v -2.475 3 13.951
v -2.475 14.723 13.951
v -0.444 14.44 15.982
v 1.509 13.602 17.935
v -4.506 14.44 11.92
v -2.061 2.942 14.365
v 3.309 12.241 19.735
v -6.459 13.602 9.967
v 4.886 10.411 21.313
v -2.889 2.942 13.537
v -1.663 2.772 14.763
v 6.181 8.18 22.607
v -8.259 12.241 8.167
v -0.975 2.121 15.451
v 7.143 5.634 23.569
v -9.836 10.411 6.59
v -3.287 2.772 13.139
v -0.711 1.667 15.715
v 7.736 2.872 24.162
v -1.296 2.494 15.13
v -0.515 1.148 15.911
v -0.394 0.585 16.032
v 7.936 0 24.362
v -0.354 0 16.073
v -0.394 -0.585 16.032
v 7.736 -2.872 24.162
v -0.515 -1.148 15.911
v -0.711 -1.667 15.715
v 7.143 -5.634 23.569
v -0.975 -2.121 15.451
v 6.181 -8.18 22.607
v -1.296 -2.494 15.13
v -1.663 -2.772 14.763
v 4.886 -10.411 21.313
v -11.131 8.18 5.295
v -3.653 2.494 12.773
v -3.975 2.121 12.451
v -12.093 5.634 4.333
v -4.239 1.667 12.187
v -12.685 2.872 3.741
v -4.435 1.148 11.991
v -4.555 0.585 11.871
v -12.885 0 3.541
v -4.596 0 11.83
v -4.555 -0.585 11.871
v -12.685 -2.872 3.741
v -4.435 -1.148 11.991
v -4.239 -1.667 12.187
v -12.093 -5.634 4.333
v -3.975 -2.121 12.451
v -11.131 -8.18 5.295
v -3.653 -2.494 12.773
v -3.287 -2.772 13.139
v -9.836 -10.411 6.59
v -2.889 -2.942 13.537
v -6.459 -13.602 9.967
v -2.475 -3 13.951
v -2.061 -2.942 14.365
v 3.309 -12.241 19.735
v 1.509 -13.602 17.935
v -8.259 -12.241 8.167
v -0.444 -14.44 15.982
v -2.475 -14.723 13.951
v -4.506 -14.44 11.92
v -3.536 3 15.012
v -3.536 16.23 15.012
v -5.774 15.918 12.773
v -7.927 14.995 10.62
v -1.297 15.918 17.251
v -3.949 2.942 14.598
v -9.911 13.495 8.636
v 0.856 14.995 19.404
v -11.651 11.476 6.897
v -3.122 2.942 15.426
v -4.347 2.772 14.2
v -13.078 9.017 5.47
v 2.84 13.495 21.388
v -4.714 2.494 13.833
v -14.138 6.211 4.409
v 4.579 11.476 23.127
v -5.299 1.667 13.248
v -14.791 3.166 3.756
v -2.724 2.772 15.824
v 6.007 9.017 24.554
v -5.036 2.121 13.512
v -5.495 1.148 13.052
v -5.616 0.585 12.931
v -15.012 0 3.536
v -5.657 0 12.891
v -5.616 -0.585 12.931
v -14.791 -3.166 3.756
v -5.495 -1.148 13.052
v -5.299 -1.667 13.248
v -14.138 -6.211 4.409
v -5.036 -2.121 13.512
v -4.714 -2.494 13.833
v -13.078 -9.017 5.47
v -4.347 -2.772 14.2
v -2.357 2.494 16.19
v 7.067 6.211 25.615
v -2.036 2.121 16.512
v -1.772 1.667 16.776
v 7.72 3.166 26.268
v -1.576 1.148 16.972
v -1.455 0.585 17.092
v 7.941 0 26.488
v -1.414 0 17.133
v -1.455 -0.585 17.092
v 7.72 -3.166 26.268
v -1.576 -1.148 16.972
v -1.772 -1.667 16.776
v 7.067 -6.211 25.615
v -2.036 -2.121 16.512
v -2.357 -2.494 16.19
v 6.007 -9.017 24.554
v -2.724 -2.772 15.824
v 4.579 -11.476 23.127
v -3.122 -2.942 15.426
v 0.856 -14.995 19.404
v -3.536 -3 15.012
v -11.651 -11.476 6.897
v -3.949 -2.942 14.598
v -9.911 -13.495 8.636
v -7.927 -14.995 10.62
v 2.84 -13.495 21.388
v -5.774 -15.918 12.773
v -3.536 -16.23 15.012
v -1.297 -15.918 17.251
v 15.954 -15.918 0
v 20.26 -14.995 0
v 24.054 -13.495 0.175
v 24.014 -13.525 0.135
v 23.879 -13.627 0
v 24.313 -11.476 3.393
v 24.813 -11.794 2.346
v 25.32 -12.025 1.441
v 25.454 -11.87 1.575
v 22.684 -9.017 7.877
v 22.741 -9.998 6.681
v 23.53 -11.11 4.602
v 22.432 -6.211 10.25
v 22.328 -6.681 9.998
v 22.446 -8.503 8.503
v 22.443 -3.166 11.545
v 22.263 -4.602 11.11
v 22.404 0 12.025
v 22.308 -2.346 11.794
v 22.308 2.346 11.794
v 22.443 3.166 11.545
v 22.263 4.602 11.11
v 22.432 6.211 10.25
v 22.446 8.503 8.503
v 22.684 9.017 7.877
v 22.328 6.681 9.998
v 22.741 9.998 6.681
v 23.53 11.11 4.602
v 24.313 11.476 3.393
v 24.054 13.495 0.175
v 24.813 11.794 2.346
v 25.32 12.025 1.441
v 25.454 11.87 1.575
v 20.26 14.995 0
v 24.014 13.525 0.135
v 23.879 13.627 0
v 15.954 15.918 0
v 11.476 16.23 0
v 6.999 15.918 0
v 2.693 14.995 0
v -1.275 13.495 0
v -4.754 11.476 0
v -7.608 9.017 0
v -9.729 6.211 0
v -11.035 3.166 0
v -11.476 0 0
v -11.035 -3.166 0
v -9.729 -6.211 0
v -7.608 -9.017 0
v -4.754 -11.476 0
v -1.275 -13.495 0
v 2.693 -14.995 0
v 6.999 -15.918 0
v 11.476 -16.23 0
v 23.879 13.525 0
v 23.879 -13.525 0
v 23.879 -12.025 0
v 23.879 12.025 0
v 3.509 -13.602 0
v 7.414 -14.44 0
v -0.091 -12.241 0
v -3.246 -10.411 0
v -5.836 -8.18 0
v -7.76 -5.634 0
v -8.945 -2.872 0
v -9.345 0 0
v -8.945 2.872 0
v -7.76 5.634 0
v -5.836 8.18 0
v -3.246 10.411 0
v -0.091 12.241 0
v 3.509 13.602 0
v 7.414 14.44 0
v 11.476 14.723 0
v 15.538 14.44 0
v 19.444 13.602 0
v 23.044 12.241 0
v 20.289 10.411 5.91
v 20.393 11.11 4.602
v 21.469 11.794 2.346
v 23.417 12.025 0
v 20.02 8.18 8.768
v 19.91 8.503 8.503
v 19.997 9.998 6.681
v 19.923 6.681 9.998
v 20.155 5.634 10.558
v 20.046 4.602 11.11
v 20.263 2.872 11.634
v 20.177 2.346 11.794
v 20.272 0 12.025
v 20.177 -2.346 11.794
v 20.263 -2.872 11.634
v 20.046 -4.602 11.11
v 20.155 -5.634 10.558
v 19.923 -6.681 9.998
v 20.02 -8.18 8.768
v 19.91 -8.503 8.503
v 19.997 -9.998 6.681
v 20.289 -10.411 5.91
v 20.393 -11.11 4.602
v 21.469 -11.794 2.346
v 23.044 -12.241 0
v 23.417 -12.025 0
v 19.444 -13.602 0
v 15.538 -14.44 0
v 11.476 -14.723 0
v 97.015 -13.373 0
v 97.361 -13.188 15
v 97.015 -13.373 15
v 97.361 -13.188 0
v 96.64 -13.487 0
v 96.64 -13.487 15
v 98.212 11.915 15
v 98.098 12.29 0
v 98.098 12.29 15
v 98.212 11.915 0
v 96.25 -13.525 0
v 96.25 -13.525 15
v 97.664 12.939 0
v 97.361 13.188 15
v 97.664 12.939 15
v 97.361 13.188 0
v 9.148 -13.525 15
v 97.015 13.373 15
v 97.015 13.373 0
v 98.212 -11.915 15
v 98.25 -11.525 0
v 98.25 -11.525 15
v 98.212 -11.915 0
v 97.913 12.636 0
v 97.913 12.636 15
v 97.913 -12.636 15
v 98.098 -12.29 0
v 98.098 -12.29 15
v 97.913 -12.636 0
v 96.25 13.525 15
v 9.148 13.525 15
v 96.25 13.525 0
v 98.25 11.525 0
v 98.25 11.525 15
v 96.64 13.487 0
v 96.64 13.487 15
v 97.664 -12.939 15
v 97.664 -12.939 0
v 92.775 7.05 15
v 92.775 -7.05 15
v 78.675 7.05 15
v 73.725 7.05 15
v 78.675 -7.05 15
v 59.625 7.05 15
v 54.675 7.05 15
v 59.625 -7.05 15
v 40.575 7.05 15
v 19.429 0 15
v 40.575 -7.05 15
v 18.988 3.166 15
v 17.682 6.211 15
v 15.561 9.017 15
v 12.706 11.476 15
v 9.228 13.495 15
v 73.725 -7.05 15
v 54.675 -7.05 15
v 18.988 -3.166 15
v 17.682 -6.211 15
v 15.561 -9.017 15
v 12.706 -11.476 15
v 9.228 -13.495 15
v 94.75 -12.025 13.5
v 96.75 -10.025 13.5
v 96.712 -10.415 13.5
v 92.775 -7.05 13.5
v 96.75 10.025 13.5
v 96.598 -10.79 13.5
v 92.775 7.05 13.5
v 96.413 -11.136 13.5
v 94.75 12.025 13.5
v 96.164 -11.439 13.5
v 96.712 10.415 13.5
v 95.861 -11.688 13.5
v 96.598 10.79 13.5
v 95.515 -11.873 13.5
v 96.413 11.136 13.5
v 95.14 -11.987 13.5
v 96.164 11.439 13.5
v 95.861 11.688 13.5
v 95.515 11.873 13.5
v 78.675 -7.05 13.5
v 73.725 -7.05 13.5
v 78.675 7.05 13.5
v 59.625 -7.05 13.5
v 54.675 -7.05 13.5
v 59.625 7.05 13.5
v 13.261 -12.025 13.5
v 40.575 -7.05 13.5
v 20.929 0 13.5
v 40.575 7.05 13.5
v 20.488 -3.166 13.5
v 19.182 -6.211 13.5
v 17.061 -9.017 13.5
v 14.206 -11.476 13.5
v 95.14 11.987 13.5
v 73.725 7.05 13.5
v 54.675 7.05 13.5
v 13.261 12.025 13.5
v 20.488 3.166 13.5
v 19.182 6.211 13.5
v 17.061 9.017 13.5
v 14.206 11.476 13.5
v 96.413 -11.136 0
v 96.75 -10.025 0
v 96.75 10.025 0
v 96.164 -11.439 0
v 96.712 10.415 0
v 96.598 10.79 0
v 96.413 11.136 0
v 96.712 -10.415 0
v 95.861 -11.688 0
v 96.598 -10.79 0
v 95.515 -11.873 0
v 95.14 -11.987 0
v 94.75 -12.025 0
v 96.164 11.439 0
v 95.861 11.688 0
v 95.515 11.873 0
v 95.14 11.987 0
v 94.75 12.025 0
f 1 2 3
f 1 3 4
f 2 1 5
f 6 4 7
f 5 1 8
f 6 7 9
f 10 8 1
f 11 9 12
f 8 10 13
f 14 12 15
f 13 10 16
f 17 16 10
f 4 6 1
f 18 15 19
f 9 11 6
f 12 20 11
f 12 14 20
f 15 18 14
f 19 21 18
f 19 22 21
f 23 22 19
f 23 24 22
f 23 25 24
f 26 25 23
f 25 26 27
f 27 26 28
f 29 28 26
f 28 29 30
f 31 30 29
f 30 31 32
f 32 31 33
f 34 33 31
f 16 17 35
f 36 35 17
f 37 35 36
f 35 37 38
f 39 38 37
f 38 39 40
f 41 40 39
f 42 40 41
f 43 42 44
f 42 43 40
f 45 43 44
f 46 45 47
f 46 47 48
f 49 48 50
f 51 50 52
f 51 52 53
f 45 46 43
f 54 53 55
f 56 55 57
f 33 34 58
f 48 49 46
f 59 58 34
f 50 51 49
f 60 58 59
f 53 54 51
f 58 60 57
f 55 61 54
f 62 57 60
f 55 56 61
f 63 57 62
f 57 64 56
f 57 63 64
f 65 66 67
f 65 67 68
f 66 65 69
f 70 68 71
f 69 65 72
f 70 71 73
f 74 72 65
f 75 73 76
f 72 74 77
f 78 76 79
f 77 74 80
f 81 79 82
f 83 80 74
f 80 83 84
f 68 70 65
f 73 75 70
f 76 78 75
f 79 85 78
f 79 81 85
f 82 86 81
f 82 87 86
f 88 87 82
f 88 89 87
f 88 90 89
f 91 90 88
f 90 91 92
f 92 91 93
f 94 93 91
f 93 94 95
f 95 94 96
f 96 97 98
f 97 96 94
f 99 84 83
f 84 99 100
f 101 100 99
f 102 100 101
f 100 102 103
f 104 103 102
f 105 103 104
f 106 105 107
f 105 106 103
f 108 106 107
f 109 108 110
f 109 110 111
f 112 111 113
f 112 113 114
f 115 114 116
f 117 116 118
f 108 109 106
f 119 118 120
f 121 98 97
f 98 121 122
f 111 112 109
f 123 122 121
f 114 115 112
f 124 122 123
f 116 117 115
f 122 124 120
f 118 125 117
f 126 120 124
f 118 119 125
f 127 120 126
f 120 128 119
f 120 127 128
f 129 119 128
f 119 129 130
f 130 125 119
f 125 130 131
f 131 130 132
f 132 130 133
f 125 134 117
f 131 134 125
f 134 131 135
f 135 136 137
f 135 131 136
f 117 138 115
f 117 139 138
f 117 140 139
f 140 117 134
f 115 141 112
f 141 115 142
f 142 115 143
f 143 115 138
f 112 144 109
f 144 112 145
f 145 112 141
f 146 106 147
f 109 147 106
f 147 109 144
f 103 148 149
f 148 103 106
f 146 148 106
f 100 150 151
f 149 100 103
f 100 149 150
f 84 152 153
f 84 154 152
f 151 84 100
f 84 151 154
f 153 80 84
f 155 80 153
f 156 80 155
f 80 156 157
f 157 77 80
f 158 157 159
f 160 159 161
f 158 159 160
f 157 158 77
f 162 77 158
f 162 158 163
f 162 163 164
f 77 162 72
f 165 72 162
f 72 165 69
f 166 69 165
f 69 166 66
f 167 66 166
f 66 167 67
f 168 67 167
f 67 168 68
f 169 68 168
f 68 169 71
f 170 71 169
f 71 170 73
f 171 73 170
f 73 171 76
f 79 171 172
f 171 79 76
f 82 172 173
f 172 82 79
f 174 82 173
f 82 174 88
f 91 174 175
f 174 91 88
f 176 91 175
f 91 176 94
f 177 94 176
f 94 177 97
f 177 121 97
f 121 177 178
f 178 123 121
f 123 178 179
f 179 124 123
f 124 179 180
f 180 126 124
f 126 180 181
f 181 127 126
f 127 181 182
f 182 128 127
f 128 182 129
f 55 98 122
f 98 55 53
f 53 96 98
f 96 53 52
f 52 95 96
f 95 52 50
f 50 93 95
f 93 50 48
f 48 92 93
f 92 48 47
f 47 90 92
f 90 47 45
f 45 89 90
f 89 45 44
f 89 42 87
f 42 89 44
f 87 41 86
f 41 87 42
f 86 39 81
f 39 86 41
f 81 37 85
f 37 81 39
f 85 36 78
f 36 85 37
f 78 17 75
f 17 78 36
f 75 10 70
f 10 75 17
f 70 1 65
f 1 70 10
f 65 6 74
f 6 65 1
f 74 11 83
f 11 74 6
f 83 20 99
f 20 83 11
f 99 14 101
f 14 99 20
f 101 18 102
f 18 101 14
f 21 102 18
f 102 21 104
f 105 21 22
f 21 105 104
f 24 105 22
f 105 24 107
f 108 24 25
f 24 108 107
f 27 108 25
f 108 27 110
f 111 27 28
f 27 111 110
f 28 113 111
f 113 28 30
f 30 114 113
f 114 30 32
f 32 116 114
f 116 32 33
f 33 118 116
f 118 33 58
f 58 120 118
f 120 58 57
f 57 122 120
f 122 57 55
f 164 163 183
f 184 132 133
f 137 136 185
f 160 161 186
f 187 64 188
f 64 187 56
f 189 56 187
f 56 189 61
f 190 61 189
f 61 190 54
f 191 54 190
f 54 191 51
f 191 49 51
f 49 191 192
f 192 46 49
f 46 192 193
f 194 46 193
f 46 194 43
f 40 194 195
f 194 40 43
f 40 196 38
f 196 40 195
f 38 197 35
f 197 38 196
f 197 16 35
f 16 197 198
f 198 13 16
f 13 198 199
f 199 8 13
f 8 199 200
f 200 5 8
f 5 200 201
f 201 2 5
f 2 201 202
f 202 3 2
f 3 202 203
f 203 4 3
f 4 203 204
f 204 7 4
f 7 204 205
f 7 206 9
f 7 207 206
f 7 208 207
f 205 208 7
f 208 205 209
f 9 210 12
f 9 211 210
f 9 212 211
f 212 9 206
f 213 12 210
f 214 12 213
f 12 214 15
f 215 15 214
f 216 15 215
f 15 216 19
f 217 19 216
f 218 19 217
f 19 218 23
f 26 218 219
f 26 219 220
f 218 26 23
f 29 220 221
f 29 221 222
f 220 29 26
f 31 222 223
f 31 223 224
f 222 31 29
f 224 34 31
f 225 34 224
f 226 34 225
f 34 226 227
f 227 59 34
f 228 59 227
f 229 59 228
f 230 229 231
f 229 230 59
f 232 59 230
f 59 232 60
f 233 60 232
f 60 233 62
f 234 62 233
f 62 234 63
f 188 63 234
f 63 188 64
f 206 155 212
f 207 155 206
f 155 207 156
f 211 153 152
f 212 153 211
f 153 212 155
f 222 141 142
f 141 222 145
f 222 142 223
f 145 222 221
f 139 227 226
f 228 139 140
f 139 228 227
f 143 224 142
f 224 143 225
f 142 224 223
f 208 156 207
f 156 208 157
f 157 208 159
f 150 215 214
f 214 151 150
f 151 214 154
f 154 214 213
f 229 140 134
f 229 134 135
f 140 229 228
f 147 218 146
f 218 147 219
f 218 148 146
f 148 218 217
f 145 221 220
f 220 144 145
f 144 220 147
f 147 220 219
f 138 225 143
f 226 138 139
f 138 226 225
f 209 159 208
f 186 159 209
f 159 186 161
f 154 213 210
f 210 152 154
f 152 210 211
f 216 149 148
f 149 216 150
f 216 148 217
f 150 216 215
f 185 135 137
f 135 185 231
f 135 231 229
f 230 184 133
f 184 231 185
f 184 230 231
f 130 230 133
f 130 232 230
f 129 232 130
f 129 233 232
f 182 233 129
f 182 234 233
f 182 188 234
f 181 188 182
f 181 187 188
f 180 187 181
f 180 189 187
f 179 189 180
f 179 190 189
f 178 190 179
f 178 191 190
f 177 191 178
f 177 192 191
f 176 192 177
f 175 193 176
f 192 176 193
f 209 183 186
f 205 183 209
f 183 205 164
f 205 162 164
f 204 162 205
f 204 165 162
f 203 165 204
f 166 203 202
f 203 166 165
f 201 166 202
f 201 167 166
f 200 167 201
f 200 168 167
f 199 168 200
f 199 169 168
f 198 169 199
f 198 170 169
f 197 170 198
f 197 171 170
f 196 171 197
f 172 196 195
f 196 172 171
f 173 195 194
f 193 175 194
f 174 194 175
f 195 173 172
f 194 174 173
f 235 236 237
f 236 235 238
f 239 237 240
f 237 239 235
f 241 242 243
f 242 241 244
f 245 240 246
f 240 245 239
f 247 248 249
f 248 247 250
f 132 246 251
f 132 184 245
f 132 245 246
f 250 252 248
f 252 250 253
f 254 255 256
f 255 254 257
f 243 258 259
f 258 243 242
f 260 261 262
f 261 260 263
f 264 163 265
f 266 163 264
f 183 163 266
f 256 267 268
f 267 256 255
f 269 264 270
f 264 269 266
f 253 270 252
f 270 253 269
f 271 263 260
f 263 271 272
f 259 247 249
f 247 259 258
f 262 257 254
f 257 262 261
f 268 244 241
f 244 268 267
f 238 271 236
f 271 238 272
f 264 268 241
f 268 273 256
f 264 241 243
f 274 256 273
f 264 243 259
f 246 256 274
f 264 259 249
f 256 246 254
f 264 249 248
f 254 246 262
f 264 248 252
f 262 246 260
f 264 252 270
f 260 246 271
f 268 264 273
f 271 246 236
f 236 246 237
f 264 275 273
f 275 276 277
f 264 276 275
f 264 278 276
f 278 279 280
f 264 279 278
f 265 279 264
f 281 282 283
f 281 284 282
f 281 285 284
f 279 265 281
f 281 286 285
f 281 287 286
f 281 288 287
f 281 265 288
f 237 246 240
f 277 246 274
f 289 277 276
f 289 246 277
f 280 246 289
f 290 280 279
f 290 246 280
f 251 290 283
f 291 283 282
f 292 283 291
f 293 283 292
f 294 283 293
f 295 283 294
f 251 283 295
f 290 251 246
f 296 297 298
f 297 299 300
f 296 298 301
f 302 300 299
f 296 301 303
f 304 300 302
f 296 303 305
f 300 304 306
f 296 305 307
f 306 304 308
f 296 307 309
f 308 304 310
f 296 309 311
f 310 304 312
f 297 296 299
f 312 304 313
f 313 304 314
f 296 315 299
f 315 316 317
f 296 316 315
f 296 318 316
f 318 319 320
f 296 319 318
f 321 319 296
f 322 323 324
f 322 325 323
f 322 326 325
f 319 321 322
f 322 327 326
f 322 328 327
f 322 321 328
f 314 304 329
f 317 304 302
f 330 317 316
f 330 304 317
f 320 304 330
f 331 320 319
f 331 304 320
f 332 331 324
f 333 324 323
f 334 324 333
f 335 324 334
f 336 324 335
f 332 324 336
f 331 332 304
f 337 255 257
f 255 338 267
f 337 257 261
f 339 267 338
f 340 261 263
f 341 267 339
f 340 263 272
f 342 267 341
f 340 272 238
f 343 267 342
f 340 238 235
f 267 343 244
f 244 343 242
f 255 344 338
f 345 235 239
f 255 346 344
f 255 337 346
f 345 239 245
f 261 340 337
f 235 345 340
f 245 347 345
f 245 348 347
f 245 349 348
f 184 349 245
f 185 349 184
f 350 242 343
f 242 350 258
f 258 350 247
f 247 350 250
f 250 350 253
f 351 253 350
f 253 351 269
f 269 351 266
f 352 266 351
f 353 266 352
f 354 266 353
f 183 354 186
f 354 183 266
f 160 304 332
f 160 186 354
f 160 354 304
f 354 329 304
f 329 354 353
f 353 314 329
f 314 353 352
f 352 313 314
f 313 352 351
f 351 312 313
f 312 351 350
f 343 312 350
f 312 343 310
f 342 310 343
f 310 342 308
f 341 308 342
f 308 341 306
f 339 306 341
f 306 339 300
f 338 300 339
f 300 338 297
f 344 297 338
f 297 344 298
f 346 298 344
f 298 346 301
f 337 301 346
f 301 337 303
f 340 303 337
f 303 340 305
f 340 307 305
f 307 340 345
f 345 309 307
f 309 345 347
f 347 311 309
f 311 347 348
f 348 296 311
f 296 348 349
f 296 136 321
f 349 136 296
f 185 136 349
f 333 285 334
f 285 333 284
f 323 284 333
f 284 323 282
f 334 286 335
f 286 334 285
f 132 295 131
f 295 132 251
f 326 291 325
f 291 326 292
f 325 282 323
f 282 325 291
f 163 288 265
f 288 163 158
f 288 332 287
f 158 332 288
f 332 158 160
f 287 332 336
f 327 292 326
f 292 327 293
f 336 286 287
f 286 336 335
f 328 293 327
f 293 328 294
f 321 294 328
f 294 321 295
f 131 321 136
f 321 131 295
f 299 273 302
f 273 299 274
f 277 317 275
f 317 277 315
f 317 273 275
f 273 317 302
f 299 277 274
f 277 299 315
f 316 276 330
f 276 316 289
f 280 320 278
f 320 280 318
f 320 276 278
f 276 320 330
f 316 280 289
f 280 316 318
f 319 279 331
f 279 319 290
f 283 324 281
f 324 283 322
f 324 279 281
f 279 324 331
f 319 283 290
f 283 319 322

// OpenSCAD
$fn = 32;
thin = 0.00001;
border_radius = 2;
// See https://matt3o.com/anatomy-of-a-keyboard/
switch_hole_size = 14;
switch_distance_between_holes = 5.05;
keycap_placeholder_space = switch_hole_size + switch_distance_between_holes;
switch_tolerance = 0.1;

wall_thickness = 1.5;

x_size = keycap_placeholder_space * 5;
y_size = keycap_placeholder_space + 5;
h_size = 15;
body_base_x = x_size + wall_thickness * 2;
body_base_y = y_size + wall_thickness * 2;

knob_chamfer = 1;
knob_oversized_by = (1 / 5) * body_base_y;
knob_radius = (body_base_y / 2) + knob_oversized_by / 2;
knob_height = 11;
knob_elevation = 5;
knob_rotation = [ 0, -45, 0 ];

shaft_height = 10.20;
shaft_radius = 3;
shaft_tolerance = 0.075;

module cut()
{
    h = 100;
    x = 200;
    y = 50;
    translate([ 0, -y / 2, 0 ]) cube([ x, y, h ], true);
}

module table()
{
    h = 25;
    x = 100;
    y = 100;
    translate([ 0, 0, -h / 2 ]) cube([ x, y, h ], true);
}

module rotary_encoder()
{
    translate([ 0, 0, -10 ])
    {
        translate([ 0, 0, 5 ]) cube([ 12, 12, 10 ], center = true);
        translate([ 0, 0, 10 ]) cylinder(7, r = 7 / 2);
        translate([ 0, 0, 10 + 7 ]) cylinder(12.5, r = 6 / 2);
    }
}

module knob()
{
    translate([ 0, 0, 0.5 + knob_elevation ])
    {
        difference()
        {
            union()
            {
                cylinder(h = knob_height - knob_chamfer, r = knob_radius);

                translate([ 0, 0, knob_height - knob_chamfer ]) hull()
                {
                    linear_extrude(height = thin) circle(r = knob_radius);
                    translate([ 0, 0, knob_chamfer ]) linear_extrude(height = thin) offset(delta = -knob_chamfer)
                        circle(r = knob_radius);
                }
            }

            difference()
            {
                cylinder(h = knob_height - wall_thickness, r = shaft_radius + shaft_tolerance);
                translate([ -shaft_radius, shaft_radius / 1.7, 0 ]) cube([ shaft_radius * 2, 10, shaft_height ]);
            }
        }
    }
}

module knob_base()
{
    h = 25;

    translate([ 0, 0, -h ])
    {
        translate([ 0, 0, h + knob_elevation - wall_thickness ]) linear_extrude(height = wall_thickness) difference()
        {
            circle(r = knob_radius);
            circle(r = shaft_radius);
        }
        linear_extrude(height = knob_elevation + h) difference()
        {
            circle(r = knob_radius);
            offset(delta = -wall_thickness) circle(r = knob_radius);
        }
    }
}

module knob_assembly()
{
    difference()
    {
        translate([ 0, 0, knob_radius / sqrt(2) ]) rotate(knob_rotation)
        {
            // translate([ 0, 0, knob_elevation - wall_thickness ]) color([ 0, 0, 1, 0.8 ]) rotary_encoder();
            // knob();
            knob_base();
        }

        // hole for body

        color("red") translate([ knob_radius / sqrt(2), 0, 0 ]) rotate([ 0, 90, 0 ])
            cylinder(h = x_size / 2, r = y_size / 2);
        table();
    }
}

module body()
{
    difference()
    {
        translate([ body_base_x / 2, 0, 0 ])
        {
            body_base_x_corrected = body_base_x - (border_radius * 2);
            body_base_y_corrected = body_base_y - (border_radius * 2);

            color("blue") translate([ 0, 0, h_size - wall_thickness ]) linear_extrude(height = wall_thickness)
                offset(r = border_radius) square([ body_base_x_corrected, body_base_y_corrected ], center = true);

            linear_extrude(height = h_size - wall_thickness) difference()
            {
                offset(r = border_radius) square([ body_base_x_corrected, body_base_y_corrected ], center = true);
                offset(r = border_radius) offset(delta = -wall_thickness)
                    square([ body_base_x_corrected, body_base_y_corrected ], center = true);
            }
        }

        // hole for knob_base
        h = 50;
        translate([ 0, 0, knob_radius / sqrt(2) ]) rotate(knob_rotation)
        {
            cylinder(h = h, r = knob_radius, center = true);
            translate([ -knob_radius / 2, 0, 0 ]) cube(size = [ knob_radius, knob_radius * 2, h ], center = true);
        }

        // switch holes
        for (column = [0:3 - 1])
        {
            translate([ x_size - column * keycap_placeholder_space - keycap_placeholder_space / 2, 0, h_size ])
                cube(switch_hole_size + switch_tolerance, center = true);
        }
    }
}

module main()
{
    difference()
    {
        union()
        {
            knob_assembly();
            body();
        }

        // difference()
        // {
        // translate([ body_base_x / 2, 0, (h_size - wall_thickness) / 2 ])
        //     cube([ body_base_x - wall_thickness * 2, body_base_y - wall_thickness * 2, h_size - wall_thickness ],
        //          center = true);
        // }
        // cut();
    }
}

main();
